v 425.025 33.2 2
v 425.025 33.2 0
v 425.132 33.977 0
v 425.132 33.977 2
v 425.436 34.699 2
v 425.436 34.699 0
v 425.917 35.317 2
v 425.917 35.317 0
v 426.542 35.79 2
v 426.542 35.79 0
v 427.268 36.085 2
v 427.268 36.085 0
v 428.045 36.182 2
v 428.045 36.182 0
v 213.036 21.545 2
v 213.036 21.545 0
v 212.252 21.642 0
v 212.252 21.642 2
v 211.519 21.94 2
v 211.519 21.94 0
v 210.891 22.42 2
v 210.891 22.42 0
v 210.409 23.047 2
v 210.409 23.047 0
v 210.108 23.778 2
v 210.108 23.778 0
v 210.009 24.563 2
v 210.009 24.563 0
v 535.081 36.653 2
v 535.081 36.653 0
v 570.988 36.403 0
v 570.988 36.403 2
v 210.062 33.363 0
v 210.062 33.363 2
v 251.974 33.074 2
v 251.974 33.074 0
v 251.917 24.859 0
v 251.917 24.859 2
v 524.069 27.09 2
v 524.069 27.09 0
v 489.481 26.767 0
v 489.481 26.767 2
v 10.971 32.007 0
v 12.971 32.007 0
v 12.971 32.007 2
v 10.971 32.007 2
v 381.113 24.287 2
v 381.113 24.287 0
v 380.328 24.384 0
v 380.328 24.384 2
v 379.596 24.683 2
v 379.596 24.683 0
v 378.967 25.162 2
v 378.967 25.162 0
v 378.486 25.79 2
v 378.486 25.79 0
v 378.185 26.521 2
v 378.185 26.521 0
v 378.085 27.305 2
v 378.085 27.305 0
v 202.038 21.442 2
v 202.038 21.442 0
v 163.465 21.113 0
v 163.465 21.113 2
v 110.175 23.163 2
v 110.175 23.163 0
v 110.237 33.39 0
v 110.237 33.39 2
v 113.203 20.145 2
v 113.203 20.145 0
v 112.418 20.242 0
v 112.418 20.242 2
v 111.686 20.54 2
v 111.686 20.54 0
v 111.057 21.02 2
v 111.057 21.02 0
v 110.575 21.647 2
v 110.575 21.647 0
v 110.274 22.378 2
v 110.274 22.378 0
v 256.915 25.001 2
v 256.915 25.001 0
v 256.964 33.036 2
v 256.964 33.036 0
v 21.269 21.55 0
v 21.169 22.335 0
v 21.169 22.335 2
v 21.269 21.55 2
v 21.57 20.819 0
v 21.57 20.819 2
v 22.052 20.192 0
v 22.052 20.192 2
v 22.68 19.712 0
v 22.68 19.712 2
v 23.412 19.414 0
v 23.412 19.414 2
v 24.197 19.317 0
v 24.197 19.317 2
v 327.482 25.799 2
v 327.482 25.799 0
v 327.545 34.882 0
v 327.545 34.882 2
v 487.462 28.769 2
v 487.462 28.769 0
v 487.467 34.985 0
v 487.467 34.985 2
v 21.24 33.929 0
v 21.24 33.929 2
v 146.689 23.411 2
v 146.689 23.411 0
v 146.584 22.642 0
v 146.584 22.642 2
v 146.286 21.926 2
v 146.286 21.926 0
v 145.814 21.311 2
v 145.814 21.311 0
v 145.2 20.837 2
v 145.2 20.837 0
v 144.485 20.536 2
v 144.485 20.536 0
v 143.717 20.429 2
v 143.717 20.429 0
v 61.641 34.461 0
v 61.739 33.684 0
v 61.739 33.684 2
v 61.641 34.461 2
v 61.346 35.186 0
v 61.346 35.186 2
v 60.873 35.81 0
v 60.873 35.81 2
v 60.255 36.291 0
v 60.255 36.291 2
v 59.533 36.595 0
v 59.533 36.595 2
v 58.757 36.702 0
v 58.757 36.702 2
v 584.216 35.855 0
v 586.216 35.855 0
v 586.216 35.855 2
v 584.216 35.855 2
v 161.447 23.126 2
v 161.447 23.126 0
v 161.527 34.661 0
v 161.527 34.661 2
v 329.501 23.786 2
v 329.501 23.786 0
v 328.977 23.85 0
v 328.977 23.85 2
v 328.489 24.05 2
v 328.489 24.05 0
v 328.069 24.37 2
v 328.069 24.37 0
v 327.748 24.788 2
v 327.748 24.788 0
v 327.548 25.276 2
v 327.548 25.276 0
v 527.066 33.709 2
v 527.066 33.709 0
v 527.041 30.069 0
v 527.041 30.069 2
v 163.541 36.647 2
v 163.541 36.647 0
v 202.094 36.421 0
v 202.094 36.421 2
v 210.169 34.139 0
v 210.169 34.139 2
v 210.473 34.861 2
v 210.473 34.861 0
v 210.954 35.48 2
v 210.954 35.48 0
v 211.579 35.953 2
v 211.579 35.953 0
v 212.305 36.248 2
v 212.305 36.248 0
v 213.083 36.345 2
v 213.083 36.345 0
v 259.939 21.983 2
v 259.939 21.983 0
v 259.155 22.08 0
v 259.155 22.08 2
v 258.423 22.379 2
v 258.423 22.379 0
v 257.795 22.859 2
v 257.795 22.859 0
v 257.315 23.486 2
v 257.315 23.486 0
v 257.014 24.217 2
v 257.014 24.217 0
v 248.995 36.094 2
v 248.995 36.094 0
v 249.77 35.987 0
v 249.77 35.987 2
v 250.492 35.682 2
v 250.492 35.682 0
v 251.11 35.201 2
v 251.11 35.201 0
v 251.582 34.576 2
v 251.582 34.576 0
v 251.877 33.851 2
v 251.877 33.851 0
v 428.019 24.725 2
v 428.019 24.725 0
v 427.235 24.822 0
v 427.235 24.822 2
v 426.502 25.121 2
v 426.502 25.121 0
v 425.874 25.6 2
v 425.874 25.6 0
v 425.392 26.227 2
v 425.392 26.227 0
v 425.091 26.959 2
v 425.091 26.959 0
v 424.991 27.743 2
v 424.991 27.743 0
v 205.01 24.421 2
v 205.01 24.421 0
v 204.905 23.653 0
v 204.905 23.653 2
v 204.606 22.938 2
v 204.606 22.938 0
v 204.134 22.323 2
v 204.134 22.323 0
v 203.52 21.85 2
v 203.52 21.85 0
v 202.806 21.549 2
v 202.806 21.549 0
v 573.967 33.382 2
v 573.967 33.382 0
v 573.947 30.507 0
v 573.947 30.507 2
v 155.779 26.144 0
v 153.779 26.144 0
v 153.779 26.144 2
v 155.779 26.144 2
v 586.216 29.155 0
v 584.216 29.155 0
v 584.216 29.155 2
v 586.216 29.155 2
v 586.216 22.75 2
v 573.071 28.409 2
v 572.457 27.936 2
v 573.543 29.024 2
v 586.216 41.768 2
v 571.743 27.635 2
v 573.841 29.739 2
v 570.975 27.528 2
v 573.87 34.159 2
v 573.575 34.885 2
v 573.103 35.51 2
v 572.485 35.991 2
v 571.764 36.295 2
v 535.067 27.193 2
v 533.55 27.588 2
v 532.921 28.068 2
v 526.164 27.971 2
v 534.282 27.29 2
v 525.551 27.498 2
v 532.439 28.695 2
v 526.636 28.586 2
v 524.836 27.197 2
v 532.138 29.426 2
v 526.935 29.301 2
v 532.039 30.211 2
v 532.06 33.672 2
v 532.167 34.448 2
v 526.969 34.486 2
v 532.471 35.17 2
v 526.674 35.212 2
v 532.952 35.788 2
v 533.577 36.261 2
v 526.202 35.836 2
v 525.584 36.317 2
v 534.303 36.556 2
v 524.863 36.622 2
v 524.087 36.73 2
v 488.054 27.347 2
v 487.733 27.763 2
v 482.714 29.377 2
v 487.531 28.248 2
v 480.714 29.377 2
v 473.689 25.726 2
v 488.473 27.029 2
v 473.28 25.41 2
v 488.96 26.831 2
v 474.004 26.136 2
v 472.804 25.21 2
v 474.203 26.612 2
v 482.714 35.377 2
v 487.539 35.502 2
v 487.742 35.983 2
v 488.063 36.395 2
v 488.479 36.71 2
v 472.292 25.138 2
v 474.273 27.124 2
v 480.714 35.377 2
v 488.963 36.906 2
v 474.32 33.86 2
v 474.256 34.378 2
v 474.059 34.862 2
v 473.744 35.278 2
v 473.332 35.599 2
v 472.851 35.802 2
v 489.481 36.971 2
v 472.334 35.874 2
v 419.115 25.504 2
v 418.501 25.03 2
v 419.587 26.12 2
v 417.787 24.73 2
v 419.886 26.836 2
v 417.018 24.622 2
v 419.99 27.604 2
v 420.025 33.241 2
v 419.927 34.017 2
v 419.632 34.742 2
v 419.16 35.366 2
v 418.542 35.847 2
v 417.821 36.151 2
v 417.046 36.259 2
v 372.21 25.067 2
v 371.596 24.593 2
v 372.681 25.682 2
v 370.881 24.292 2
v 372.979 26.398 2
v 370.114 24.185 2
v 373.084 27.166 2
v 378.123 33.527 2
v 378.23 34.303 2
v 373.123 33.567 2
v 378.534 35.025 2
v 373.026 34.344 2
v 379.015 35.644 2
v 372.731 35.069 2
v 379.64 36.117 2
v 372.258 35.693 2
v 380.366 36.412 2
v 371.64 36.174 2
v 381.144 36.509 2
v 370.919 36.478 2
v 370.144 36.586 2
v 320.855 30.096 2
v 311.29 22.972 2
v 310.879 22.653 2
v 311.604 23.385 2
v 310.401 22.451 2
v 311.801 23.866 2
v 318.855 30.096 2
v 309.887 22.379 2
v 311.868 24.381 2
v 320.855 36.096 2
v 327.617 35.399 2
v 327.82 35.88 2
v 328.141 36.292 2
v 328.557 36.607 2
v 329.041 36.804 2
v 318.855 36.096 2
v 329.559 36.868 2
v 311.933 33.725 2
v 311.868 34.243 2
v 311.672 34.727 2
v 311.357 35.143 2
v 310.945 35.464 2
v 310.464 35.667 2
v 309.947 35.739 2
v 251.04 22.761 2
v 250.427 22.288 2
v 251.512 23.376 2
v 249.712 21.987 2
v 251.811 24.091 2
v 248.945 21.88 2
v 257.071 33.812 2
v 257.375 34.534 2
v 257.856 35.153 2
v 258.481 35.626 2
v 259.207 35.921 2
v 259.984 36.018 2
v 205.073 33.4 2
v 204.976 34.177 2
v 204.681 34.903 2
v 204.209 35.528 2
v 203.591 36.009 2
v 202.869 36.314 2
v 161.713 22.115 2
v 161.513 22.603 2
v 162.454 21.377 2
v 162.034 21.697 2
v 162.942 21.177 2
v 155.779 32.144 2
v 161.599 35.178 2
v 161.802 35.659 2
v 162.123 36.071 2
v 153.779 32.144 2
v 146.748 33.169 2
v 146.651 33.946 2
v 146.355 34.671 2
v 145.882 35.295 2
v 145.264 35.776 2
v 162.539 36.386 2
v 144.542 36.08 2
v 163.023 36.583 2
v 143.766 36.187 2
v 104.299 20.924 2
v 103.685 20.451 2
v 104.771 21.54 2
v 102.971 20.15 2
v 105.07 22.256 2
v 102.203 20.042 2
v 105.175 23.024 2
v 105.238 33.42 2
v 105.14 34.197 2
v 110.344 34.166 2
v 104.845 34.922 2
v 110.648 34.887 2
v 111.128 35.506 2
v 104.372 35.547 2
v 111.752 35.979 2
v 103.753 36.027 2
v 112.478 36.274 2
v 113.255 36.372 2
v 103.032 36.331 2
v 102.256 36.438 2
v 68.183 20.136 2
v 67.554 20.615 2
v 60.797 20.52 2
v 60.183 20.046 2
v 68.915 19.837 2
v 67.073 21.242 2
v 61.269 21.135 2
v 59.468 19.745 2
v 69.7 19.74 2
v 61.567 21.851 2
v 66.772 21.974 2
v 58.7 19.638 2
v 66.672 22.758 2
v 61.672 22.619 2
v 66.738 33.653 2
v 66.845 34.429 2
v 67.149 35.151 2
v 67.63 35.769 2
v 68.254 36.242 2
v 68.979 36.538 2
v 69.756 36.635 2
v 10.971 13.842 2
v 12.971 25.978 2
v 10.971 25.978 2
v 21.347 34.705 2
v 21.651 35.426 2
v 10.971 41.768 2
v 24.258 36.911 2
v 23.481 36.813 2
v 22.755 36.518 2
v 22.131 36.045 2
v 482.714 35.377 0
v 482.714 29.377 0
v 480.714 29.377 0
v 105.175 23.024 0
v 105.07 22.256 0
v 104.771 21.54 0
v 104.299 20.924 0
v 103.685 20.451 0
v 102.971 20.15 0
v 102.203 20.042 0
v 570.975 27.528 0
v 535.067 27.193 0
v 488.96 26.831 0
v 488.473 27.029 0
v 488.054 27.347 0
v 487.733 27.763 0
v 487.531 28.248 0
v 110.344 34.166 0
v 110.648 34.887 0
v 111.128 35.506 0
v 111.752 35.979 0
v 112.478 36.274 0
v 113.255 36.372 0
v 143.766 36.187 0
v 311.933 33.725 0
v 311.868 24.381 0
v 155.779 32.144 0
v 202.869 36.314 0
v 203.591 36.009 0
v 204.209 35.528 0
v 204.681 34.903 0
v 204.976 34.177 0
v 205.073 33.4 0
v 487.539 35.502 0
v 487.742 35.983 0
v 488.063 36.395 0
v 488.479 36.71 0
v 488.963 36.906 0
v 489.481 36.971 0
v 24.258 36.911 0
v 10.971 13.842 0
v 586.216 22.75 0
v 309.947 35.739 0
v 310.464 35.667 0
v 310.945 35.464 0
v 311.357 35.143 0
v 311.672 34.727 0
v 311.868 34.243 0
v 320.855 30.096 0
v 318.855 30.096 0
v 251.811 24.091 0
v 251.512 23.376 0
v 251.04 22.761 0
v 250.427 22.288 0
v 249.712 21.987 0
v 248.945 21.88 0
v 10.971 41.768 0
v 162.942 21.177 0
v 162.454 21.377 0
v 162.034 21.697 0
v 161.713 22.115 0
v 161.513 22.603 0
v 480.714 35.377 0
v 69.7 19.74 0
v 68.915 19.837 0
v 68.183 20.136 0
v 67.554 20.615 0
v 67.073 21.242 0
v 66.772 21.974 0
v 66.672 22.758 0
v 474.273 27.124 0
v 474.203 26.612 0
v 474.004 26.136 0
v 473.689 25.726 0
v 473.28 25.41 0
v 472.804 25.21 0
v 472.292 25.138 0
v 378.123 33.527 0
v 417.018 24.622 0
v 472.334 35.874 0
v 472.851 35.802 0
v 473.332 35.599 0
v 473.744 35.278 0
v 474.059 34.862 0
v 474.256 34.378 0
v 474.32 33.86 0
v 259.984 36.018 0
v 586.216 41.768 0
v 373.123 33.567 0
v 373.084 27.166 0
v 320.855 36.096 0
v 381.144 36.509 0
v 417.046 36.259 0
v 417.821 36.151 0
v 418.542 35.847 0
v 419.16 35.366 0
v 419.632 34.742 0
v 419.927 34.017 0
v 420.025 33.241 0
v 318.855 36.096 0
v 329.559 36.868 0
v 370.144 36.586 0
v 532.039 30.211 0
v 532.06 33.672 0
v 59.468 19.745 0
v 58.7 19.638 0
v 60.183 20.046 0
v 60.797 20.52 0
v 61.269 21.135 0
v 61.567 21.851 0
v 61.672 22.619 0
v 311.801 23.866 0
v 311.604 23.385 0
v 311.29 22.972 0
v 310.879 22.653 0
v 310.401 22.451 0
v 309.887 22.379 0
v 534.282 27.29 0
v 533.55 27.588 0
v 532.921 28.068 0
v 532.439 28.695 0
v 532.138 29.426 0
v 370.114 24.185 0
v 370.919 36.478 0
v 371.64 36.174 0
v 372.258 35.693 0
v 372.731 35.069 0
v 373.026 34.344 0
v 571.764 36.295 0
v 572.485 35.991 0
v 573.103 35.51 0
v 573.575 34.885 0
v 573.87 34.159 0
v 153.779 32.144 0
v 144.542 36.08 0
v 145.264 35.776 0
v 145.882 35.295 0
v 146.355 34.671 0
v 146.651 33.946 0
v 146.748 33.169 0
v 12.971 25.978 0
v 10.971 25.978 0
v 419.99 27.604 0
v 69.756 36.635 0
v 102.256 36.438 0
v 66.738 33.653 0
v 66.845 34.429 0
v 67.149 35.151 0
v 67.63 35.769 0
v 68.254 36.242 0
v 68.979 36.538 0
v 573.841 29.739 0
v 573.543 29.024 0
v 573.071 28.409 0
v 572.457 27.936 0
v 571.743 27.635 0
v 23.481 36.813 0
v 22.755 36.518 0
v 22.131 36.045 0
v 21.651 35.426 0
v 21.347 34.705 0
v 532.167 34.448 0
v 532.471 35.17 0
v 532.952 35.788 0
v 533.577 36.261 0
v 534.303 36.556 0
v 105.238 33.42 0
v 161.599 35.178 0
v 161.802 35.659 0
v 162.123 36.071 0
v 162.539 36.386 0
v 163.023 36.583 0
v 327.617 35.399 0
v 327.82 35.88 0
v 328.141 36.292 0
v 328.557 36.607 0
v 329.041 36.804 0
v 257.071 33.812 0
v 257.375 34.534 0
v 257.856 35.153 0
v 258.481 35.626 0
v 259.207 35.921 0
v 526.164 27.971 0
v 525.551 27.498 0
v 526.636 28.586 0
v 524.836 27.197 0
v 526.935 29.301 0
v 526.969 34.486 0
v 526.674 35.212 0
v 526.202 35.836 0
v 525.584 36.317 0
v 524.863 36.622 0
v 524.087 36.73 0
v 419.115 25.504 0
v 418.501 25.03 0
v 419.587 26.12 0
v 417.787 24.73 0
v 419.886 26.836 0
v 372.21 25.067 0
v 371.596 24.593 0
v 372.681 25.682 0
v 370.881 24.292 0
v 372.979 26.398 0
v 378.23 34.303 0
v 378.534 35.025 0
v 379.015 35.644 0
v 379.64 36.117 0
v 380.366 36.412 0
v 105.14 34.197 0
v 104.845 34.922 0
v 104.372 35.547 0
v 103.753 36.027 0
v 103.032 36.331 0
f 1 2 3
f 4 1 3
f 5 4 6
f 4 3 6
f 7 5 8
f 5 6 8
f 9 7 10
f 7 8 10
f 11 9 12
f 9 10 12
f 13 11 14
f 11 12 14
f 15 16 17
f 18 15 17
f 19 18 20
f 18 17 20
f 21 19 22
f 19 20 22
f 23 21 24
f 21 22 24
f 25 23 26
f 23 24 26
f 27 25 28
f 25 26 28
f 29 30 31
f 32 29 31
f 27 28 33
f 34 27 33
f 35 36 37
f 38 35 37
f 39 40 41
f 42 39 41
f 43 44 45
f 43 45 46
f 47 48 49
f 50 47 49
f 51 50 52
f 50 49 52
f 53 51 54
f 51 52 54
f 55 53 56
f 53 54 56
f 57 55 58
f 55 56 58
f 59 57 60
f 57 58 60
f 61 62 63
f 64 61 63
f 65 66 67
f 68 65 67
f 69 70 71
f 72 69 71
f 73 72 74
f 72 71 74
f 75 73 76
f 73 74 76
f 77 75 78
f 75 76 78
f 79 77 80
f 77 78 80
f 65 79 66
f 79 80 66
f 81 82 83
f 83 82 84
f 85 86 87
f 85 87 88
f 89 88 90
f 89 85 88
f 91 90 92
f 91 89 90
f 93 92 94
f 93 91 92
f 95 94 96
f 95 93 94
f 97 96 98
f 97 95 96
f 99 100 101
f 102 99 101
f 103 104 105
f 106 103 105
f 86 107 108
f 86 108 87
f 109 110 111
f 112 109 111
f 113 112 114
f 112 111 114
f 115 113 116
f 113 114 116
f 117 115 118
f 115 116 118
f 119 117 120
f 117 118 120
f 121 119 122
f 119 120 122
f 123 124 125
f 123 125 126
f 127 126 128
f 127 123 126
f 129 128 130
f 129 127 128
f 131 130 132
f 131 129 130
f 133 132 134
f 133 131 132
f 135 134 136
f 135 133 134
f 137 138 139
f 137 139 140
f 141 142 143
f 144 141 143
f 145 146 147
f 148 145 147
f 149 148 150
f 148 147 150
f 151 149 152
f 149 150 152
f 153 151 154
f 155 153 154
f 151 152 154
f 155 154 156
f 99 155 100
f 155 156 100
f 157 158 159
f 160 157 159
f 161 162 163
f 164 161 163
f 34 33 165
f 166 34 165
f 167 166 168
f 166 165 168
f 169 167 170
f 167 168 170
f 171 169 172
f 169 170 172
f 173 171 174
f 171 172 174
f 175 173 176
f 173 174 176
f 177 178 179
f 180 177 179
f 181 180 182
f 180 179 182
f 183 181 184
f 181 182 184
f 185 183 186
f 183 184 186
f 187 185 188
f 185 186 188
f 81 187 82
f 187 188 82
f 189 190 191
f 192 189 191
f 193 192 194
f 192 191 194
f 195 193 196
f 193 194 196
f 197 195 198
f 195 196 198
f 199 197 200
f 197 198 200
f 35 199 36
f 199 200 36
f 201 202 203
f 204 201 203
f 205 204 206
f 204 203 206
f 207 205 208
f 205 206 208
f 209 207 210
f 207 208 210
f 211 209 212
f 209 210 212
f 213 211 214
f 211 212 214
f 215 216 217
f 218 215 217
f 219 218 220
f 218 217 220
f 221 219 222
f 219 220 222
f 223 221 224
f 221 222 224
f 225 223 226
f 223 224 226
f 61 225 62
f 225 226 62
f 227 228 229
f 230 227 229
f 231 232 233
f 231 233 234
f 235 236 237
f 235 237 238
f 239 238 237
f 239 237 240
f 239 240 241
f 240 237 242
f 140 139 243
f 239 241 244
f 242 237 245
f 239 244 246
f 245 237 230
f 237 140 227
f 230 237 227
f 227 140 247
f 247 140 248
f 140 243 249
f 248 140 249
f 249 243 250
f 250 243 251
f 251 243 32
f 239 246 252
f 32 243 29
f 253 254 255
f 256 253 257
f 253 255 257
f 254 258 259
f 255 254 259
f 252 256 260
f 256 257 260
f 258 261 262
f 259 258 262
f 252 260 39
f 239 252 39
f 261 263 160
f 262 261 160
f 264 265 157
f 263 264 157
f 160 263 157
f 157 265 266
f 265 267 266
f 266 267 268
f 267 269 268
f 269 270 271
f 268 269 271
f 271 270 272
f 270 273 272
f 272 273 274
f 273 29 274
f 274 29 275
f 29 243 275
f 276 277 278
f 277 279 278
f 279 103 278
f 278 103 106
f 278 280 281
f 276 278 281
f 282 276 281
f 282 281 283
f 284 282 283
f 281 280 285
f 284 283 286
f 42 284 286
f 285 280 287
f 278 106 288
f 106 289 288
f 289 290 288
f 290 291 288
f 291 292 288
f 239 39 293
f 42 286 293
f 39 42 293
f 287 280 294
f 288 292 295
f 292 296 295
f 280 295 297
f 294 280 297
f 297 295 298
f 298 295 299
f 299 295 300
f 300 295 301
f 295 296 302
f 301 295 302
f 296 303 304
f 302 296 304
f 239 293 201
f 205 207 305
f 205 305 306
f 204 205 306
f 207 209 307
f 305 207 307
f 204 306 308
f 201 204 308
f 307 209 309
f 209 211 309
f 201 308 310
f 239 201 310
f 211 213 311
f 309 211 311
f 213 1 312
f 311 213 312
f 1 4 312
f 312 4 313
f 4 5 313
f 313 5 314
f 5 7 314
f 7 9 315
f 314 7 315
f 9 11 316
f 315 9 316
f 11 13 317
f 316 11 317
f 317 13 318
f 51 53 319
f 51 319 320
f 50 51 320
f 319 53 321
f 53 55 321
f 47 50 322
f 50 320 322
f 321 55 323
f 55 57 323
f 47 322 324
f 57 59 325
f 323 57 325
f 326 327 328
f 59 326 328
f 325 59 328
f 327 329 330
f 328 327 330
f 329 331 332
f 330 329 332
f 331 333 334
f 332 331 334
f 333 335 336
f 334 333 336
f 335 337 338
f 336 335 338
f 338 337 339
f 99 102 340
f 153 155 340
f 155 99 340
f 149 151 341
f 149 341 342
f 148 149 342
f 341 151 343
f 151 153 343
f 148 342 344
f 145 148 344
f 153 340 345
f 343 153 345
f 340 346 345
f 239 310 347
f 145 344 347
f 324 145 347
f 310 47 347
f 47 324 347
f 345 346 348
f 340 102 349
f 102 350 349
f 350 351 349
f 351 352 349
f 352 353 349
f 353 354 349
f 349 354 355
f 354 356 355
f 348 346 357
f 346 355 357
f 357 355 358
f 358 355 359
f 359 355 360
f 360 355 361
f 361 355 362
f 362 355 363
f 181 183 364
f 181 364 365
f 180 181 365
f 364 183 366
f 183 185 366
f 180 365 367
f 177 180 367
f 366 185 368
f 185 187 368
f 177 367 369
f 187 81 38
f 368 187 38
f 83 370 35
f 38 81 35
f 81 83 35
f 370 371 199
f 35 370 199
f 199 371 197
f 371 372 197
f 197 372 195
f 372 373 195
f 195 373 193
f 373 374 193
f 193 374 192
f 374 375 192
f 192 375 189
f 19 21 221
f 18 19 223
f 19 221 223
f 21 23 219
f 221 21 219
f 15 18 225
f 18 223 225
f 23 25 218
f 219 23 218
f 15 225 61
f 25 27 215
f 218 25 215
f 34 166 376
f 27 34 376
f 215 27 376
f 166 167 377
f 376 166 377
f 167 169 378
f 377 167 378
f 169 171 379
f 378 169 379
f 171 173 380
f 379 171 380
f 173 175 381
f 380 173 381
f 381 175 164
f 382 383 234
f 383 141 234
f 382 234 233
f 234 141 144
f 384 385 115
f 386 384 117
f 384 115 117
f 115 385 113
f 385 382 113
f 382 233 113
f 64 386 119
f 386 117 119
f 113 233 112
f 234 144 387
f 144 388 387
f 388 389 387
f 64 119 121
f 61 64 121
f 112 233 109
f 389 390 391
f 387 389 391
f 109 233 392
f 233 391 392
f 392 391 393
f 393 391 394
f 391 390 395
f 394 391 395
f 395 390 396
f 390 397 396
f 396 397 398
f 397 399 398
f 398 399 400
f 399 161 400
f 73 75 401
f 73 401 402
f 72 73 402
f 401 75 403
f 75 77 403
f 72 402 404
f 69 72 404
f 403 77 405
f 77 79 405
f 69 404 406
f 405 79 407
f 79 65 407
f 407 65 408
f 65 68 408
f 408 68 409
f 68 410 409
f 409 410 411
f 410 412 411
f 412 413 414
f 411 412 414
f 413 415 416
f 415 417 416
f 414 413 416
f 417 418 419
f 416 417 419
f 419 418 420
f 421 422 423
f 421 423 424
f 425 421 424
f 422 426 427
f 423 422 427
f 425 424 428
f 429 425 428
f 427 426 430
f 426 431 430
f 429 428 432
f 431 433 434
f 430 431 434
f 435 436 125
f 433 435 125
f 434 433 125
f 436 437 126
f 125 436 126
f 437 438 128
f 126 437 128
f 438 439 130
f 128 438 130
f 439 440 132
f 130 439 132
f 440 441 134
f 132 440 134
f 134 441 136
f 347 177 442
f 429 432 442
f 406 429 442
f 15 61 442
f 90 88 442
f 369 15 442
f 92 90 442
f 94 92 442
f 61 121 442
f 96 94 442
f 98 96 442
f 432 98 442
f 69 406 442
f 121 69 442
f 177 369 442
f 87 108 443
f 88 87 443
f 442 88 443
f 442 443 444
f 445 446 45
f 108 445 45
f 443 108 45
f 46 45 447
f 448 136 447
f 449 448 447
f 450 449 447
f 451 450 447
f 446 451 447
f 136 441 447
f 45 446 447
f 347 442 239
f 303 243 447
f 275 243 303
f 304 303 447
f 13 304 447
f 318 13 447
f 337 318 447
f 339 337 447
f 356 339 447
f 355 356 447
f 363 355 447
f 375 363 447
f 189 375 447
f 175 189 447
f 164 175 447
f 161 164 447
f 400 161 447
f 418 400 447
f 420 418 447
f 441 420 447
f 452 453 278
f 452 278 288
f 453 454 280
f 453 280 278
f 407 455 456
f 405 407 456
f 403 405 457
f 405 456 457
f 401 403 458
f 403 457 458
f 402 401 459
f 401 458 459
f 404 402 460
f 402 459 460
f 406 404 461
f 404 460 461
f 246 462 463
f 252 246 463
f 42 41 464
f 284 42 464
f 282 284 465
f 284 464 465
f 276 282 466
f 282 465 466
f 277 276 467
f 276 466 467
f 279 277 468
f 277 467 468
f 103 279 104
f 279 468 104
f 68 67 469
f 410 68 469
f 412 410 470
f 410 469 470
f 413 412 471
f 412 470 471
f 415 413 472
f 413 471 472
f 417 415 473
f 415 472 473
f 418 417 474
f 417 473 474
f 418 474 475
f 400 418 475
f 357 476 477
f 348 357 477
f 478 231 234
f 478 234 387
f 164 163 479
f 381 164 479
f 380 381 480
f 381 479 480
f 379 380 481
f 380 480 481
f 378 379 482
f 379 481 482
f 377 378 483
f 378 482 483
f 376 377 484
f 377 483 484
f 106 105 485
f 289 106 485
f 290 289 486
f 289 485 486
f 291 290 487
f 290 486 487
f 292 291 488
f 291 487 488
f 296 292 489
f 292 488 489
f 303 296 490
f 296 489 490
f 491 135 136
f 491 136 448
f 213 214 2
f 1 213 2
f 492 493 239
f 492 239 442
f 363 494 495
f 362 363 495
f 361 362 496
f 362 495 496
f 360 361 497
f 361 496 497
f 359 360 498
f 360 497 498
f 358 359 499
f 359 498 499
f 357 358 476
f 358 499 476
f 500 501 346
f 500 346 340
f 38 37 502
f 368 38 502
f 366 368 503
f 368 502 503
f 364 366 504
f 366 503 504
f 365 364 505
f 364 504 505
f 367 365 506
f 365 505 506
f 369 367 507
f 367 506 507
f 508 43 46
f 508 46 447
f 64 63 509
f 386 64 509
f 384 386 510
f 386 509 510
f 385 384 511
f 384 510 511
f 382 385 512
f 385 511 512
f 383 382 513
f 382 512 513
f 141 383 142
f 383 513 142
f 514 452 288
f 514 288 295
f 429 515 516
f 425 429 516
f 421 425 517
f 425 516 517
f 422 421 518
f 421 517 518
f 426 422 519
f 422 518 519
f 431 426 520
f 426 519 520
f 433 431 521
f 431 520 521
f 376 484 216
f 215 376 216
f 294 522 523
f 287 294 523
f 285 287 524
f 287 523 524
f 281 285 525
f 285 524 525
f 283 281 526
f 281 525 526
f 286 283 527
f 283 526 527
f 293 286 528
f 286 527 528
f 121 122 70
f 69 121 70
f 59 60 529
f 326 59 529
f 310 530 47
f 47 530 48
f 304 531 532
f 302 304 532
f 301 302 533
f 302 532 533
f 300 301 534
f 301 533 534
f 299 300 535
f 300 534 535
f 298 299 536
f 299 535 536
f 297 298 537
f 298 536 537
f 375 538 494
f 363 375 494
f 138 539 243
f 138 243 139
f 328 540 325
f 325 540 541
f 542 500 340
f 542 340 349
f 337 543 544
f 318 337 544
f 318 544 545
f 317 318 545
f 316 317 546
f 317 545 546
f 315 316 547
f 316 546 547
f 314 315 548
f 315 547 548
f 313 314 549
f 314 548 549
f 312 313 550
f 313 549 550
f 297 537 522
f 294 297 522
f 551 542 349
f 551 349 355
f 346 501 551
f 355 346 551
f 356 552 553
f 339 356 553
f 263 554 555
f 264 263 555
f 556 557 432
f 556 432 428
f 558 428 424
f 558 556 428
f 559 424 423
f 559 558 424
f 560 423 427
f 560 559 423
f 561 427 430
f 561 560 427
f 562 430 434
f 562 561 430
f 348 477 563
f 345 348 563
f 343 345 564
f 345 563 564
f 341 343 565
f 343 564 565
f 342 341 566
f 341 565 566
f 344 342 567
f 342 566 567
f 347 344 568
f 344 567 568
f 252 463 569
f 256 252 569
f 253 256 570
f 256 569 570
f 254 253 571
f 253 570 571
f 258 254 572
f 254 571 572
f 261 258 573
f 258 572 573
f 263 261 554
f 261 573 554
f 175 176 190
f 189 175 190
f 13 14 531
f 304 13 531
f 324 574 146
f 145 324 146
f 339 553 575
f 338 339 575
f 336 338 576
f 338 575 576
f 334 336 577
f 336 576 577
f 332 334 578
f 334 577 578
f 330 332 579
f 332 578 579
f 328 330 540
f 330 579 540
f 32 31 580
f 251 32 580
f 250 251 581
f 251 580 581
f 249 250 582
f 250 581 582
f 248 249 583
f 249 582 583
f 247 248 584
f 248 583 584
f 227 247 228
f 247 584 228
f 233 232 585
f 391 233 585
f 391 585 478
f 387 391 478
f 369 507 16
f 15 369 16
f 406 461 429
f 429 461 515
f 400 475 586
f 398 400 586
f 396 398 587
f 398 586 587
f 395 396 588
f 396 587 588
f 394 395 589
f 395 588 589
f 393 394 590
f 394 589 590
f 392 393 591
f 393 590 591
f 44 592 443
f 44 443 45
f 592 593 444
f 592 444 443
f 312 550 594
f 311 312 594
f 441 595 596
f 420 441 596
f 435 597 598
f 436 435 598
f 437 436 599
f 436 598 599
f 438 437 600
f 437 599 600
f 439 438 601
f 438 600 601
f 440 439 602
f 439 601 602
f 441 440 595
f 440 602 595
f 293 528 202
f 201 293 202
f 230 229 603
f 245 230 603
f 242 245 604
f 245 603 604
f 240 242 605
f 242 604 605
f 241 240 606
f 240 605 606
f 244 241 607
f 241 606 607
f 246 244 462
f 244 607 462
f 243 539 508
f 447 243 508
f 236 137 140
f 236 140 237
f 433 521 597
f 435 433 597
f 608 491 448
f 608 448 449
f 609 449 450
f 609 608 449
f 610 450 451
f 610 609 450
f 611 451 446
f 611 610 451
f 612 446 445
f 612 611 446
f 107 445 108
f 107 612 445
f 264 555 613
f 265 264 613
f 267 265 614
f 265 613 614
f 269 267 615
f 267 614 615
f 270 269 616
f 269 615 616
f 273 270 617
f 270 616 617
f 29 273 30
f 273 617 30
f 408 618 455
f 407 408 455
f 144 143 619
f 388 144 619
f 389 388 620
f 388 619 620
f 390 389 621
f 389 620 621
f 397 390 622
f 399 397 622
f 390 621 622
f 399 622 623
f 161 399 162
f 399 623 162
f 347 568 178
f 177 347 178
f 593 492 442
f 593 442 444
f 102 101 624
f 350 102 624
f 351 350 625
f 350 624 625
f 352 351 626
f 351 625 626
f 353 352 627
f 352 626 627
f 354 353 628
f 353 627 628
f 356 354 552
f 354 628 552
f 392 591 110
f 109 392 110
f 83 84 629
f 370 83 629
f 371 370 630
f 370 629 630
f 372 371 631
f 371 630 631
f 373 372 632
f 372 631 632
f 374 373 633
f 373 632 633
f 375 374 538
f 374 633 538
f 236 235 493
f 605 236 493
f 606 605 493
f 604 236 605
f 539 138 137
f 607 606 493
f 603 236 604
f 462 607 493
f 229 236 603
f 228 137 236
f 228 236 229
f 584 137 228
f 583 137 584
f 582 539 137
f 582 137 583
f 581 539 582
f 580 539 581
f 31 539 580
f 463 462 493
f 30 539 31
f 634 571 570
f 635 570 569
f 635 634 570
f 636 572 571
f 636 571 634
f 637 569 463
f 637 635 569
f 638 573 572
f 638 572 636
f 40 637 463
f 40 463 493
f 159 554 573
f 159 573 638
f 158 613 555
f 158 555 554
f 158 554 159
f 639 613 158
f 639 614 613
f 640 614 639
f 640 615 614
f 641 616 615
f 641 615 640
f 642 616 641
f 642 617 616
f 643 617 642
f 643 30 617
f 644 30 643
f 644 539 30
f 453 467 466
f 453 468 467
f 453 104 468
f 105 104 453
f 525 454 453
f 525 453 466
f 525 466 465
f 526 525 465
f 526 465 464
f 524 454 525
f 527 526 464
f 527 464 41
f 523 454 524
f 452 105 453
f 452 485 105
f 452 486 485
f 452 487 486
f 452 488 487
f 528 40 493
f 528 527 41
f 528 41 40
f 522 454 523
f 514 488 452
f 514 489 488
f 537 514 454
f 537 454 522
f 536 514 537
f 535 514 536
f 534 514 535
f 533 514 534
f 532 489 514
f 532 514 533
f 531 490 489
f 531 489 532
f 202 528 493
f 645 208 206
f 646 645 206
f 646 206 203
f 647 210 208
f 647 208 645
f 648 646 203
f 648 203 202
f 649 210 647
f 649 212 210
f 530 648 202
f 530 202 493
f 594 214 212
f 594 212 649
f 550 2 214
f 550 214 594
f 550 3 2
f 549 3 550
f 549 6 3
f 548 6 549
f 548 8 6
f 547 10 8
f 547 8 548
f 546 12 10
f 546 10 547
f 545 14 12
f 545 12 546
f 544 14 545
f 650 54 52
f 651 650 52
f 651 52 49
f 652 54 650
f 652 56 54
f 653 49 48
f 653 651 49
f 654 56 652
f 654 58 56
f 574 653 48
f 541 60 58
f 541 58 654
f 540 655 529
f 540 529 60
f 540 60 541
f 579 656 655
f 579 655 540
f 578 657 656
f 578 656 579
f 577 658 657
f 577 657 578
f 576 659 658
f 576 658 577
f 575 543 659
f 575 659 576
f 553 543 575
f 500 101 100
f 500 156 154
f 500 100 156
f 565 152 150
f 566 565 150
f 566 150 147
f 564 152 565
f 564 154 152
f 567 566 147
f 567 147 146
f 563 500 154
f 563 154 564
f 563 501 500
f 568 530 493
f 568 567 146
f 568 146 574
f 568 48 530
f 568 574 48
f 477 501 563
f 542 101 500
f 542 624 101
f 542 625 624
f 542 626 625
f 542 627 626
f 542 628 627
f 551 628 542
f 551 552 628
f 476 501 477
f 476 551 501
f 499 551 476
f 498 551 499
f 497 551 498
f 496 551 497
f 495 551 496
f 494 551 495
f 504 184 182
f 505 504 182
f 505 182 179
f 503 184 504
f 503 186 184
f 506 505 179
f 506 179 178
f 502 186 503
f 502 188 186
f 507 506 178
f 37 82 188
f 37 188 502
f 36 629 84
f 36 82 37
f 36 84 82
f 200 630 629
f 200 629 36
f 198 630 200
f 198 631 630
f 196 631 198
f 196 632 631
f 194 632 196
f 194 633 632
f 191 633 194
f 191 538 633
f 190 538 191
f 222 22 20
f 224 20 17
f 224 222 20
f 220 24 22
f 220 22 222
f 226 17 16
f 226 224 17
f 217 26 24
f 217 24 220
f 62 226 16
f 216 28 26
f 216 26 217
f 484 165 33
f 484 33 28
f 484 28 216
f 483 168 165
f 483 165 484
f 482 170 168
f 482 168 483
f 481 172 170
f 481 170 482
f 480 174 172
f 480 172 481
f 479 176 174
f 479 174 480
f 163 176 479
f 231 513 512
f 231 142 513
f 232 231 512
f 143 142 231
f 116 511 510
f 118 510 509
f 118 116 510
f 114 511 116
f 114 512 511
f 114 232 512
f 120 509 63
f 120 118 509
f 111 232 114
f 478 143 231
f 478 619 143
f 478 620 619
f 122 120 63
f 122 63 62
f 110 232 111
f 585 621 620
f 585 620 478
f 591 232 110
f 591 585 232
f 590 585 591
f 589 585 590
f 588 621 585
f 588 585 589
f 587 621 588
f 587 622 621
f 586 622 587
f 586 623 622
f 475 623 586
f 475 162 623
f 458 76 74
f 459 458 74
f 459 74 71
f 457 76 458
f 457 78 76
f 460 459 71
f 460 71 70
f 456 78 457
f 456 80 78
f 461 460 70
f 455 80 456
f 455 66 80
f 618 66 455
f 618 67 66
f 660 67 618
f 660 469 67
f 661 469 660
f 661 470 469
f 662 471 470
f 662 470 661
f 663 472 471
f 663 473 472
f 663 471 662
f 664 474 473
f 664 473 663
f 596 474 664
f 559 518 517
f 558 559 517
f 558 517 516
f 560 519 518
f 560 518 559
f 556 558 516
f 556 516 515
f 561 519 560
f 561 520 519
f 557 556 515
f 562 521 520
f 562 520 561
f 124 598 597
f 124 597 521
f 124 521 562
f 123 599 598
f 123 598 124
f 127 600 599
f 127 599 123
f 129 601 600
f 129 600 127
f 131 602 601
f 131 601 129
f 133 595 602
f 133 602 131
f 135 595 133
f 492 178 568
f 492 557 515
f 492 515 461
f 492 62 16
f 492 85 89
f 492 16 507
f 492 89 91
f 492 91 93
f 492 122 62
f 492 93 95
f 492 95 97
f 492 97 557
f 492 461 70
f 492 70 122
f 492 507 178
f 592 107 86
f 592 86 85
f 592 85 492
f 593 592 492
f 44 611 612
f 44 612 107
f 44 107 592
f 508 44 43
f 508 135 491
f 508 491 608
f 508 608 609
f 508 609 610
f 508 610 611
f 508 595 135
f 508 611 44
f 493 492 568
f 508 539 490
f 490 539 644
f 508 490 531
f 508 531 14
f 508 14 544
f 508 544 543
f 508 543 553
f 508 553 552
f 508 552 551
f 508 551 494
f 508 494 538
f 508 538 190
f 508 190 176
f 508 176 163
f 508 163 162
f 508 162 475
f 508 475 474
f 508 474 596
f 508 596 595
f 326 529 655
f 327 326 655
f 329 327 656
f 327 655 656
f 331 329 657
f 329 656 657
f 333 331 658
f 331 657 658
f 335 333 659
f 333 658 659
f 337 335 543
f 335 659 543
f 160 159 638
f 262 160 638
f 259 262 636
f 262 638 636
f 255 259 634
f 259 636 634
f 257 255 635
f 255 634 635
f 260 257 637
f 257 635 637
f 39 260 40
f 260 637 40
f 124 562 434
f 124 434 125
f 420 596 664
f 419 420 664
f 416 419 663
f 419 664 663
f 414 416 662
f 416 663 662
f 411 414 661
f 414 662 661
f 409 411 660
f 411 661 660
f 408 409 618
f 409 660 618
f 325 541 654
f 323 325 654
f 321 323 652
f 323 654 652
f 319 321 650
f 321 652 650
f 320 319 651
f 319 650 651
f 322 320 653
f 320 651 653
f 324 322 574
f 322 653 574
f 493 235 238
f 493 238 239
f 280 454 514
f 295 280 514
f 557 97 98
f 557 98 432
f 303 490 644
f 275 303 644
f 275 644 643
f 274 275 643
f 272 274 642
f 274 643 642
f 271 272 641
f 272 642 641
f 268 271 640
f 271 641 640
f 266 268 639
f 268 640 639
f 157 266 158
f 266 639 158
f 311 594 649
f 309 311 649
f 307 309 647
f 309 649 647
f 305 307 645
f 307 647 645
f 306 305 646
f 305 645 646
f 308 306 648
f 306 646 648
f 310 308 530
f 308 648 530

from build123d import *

# Parameters (mm, degrees)
MODEL_W         = 2
MODEL_H         = 6
EXTRUDE_1_DEPTH = 2


with BuildPart() as part:
    # Model → 凸台-拉伸1 (new body)
    with BuildSketch(Plane.XY):
        Polygon((586.216263019, 41.768412003), (586.216263019, 35.855412003), (584.216263019, 35.855412003), (584.216263019, 29.154912003), (586.216263019, 29.154912003), (586.216263019, 22.750482518), (10.971476696, 13.842211299), (10.971476696, 25.978012003), (12.971476696, 25.978012003), (12.971476696, 32.006812003), (10.971476696, 32.006812003), (10.971476696, 41.768412003), (154.87521024, 41.768412003), (317.652575925, 41.768412003), (481.210656258, 41.768412003), align=None)
        with Locations((154.779030244, 29.144412003)):
            Rectangle(MODEL_W, MODEL_H, mode=Mode.SUBTRACT)
        Polygon((318.855190189, 33.150012003), (318.855190189, 30.095512003), (320.855190189, 30.095512003), (320.855190189, 36.095512003), (318.855190189, 36.095512003), align=None, mode=Mode.SUBTRACT)
        Polygon((480.71418574, 34.458512003), (480.71418574, 29.376512003), (482.71418574, 29.376512003), (482.71418574, 35.376512003), (480.71418574, 35.376512003), align=None, mode=Mode.SUBTRACT)
        with BuildLine():
            Line((58.757152566, 36.70165117), (24.257789514, 36.910650883))
            ThreePointArc((24.257789514, 36.910650883), (22.131185086, 36.044838231), (21.239670672, 33.928879822))
            Line((21.239670672, 33.928879822), (21.16943188, 22.334636165))
            ThreePointArc((21.16943188, 22.334636165), (22.051503861, 20.191700151), (24.197293169, 19.316592165))
            Line((24.197293169, 19.316592165), (58.699867458, 19.637667912))
            ThreePointArc((58.699867458, 19.637667912), (60.796713244, 20.519665053), (61.671896071, 22.619364132))
            Line((61.671896071, 22.619364132), (61.738923627, 33.683532329))
            ThreePointArc((61.738923627, 33.683532329), (60.873110975, 35.810136756), (58.757152566, 36.70165117))
        make_face(mode=Mode.SUBTRACT)
        with BuildLine():
            Line((146.748077677, 33.168540536), (146.688962862, 23.41052012))
            ThreePointArc((146.688962862, 23.41052012), (145.813780035, 21.310821041), (143.716934249, 20.4288239))
            Line((143.716934249, 20.4288239), (113.202550526, 20.144861652))
            ThreePointArc((113.202550526, 20.144861652), (111.056761218, 21.019969638), (110.174689236, 23.162905652))
            Line((110.174689236, 23.162905652), (110.236644098, 33.389729523))
            ThreePointArc((110.236644098, 33.389729523), (111.128158512, 35.505687932), (113.254762939, 36.371500584))
            Line((113.254762939, 36.371500584), (143.766306616, 36.186659378))
            ThreePointArc((143.766306616, 36.186659378), (145.882265025, 35.295144964), (146.748077677, 33.168540536))
        make_face(mode=Mode.SUBTRACT)
        with BuildLine():
            Line((69.756360643, 36.635017148), (102.25576428, 36.438133338))
            ThreePointArc((102.25576428, 36.438133338), (104.371722689, 35.546618924), (105.237535341, 33.420014496))
            Line((105.237535341, 33.420014496), (105.174556682, 23.024193324))
            ThreePointArc((105.174556682, 23.024193324), (104.299373855, 20.924494244), (102.202528069, 20.042497104))
            Line((102.202528069, 20.042497104), (69.700099353, 19.740034409))
            ThreePointArc((69.700099353, 19.740034409), (67.554310045, 20.615142396), (66.672238064, 22.75807841))
            Line((66.672238064, 22.75807841), (66.738241802, 33.653246087))
            ThreePointArc((66.738241802, 33.653246087), (67.629756216, 35.769204496), (69.756360643, 36.635017148))
        make_face(mode=Mode.SUBTRACT)
        with BuildLine():
            Line((163.541092581, 36.647103391), (202.093717488, 36.421153648))
            ThreePointArc((202.093717488, 36.421153648), (204.20886557, 35.527718408), (205.072747005, 33.400328739))
            Line((205.072747005, 33.400328739), (205.010197063, 24.421095996))
            ThreePointArc((205.010197063, 24.421095996), (204.134099679, 22.323185807), (202.038269411, 21.442124358))
            Line((202.038269411, 21.442124358), (163.465475762, 21.112553873))
            ThreePointArc((163.465475762, 21.112553873), (162.034270797, 21.69658021), (161.446857912, 23.12639856))
            Line((161.446857912, 23.12639856), (161.527209308, 34.661083712))
            ThreePointArc((161.527209308, 34.661083712), (162.122832802, 36.071182434), (163.541092581, 36.647103391))
        make_face(mode=Mode.SUBTRACT)
        with BuildLine():
            Line((213.082693343, 36.344603699), (248.994694933, 36.094438268))
            ThreePointArc((248.994694933, 36.094438268), (251.109843016, 35.201003028), (251.973724451, 33.073613359))
            Line((251.973724451, 33.073613359), (251.916500205, 24.858900378))
            ThreePointArc((251.916500205, 24.858900378), (251.040402821, 22.760990189), (248.944572553, 21.87992874))
            Line((248.944572553, 21.87992874), (213.036483972, 21.544777225))
            ThreePointArc((213.036483972, 21.544777225), (210.890640913, 22.419855058), (210.008539459, 24.56282045))
            Line((210.008539459, 24.56282045), (210.061850696, 33.362850376))
            ThreePointArc((210.061850696, 33.362850376), (210.954334175, 35.479765744), (213.082693343, 36.344603699))
        make_face(mode=Mode.SUBTRACT)
        with BuildLine():
            Line((259.984364938, 36.017883484), (309.946986323, 35.73855234))
            ThreePointArc((309.946986323, 35.73855234), (311.357085044, 35.142928847), (311.933006001, 33.724669067))
            Line((311.933006001, 33.724669067), (311.867917884, 24.38107371))
            ThreePointArc((311.867917884, 24.38107371), (311.289568546, 22.971847644), (309.886518402, 22.378672834))
            Line((309.886518402, 22.378672834), (259.93857923, 21.982545284))
            ThreePointArc((259.93857923, 21.982545284), (257.795454375, 22.859145292), (256.914842601, 25.000624832))
            Line((256.914842601, 25.000624832), (256.963522291, 33.03613016))
            ThreePointArc((256.963522291, 33.03613016), (257.85600577, 35.153045529), (259.984364938, 36.017883484))
        make_face(mode=Mode.SUBTRACT)
        with BuildLine():
            Line((329.559168481, 36.86823931), (370.143868366, 36.585523546))
            ThreePointArc((370.143868366, 36.585523546), (372.258059929, 35.693057805), (373.122915621, 33.567422443))
            Line((373.122915621, 33.567422443), (373.084136783, 27.166240277))
            ThreePointArc((373.084136783, 27.166240277), (372.209502307, 25.067091475), (370.113661797, 24.184558917))
            Line((370.113661797, 24.184558917), (329.500631729, 23.7855848))
            ThreePointArc((329.500631729, 23.7855848), (328.069426764, 24.369611137), (327.482013878, 25.799429487))
            Line((327.482013878, 25.799429487), (327.545285209, 34.882219631))
            ThreePointArc((327.545285209, 34.882219631), (328.140908702, 36.292318353), (329.559168481, 36.86823931))
        make_face(mode=Mode.SUBTRACT)
        with BuildLine():
            Line((381.143677955, 36.508898129), (417.045539961, 36.258803331))
            ThreePointArc((417.045539961, 36.258803331), (419.159731524, 35.36633759), (420.024587216, 33.240702227))
            Line((420.024587216, 33.240702227), (419.990439925, 27.604044659))
            ThreePointArc((419.990439925, 27.604044659), (419.115286475, 25.504375053), (417.018494535, 24.622349215))
            Line((417.018494535, 24.622349215), (381.113087215, 24.287222726))
            ThreePointArc((381.113087215, 24.287222726), (378.967244157, 25.162300559), (378.085142702, 27.305265951))
            Line((378.085142702, 27.305265951), (378.122835308, 33.527144806))
            ThreePointArc((378.122835308, 33.527144806), (379.015318787, 35.644060174), (381.143677955, 36.508898129))
        make_face(mode=Mode.SUBTRACT)
        with BuildLine():
            Line((428.04534955, 36.182177913), (472.3342856, 35.87365819))
            ThreePointArc((472.3342856, 35.87365819), (473.744384321, 35.278034697), (474.320305278, 33.859774917))
            Line((474.320305278, 33.859774917), (474.273385029, 27.12423169))
            ThreePointArc((474.273385029, 27.12423169), (473.689320106, 25.725624897), (472.292099928, 25.138250597))
            Line((472.292099928, 25.138250597), (428.019390357, 24.725027108))
            ThreePointArc((428.019390357, 24.725027108), (425.873547299, 25.600104941), (424.991445844, 27.743070333))
            Line((424.991445844, 27.743070333), (425.024506903, 33.20042459))
            ThreePointArc((425.024506903, 33.20042459), (425.916990382, 35.317339958), (428.04534955, 36.182177913))
        make_face(mode=Mode.SUBTRACT)
        with BuildLine():
            Line((489.48114747, 36.970903278), (524.086911809, 36.729837184))
            ThreePointArc((524.086911809, 36.729837184), (526.202059891, 35.836401944), (527.065941326, 33.709012275))
            Line((527.065941326, 33.709012275), (527.040585105, 30.069050249))
            ThreePointArc((527.040585105, 30.069050249), (526.164487721, 27.97114006), (524.068657453, 27.09007861))
            Line((524.068657453, 27.09007861), (489.48114747, 26.76725284))
            ThreePointArc((489.48114747, 26.76725284), (488.054336113, 27.346909518), (487.462481687, 28.768704459))
            Line((487.462481687, 28.768704459), (487.467264197, 34.9848836))
            ThreePointArc((487.467264197, 34.9848836), (488.062887691, 36.394982321), (489.48114747, 36.970903278))
        make_face(mode=Mode.SUBTRACT)
        with BuildLine():
            Line((535.08073548, 36.653253465), (570.987889254, 36.403121804))
            ThreePointArc((570.987889254, 36.403121804), (573.103037337, 35.509686564), (573.966918772, 33.382296895))
            Line((573.966918772, 33.382296895), (573.946888247, 30.506854631))
            ThreePointArc((573.946888247, 30.506854631), (573.070790863, 28.408944442), (570.974960595, 27.527882992))
            Line((570.974960595, 27.527882992), (535.066872014, 27.192731478))
            ThreePointArc((535.066872014, 27.192731478), (532.921028955, 28.067809311), (532.038927501, 30.210774703))
            Line((532.038927501, 30.210774703), (532.059892833, 33.671500141))
            ThreePointArc((532.059892833, 33.671500141), (532.952376312, 35.78841551), (535.08073548, 36.653253465))
        make_face(mode=Mode.SUBTRACT)
    extrude(amount=EXTRUDE_1_DEPTH)


solid = part.part
